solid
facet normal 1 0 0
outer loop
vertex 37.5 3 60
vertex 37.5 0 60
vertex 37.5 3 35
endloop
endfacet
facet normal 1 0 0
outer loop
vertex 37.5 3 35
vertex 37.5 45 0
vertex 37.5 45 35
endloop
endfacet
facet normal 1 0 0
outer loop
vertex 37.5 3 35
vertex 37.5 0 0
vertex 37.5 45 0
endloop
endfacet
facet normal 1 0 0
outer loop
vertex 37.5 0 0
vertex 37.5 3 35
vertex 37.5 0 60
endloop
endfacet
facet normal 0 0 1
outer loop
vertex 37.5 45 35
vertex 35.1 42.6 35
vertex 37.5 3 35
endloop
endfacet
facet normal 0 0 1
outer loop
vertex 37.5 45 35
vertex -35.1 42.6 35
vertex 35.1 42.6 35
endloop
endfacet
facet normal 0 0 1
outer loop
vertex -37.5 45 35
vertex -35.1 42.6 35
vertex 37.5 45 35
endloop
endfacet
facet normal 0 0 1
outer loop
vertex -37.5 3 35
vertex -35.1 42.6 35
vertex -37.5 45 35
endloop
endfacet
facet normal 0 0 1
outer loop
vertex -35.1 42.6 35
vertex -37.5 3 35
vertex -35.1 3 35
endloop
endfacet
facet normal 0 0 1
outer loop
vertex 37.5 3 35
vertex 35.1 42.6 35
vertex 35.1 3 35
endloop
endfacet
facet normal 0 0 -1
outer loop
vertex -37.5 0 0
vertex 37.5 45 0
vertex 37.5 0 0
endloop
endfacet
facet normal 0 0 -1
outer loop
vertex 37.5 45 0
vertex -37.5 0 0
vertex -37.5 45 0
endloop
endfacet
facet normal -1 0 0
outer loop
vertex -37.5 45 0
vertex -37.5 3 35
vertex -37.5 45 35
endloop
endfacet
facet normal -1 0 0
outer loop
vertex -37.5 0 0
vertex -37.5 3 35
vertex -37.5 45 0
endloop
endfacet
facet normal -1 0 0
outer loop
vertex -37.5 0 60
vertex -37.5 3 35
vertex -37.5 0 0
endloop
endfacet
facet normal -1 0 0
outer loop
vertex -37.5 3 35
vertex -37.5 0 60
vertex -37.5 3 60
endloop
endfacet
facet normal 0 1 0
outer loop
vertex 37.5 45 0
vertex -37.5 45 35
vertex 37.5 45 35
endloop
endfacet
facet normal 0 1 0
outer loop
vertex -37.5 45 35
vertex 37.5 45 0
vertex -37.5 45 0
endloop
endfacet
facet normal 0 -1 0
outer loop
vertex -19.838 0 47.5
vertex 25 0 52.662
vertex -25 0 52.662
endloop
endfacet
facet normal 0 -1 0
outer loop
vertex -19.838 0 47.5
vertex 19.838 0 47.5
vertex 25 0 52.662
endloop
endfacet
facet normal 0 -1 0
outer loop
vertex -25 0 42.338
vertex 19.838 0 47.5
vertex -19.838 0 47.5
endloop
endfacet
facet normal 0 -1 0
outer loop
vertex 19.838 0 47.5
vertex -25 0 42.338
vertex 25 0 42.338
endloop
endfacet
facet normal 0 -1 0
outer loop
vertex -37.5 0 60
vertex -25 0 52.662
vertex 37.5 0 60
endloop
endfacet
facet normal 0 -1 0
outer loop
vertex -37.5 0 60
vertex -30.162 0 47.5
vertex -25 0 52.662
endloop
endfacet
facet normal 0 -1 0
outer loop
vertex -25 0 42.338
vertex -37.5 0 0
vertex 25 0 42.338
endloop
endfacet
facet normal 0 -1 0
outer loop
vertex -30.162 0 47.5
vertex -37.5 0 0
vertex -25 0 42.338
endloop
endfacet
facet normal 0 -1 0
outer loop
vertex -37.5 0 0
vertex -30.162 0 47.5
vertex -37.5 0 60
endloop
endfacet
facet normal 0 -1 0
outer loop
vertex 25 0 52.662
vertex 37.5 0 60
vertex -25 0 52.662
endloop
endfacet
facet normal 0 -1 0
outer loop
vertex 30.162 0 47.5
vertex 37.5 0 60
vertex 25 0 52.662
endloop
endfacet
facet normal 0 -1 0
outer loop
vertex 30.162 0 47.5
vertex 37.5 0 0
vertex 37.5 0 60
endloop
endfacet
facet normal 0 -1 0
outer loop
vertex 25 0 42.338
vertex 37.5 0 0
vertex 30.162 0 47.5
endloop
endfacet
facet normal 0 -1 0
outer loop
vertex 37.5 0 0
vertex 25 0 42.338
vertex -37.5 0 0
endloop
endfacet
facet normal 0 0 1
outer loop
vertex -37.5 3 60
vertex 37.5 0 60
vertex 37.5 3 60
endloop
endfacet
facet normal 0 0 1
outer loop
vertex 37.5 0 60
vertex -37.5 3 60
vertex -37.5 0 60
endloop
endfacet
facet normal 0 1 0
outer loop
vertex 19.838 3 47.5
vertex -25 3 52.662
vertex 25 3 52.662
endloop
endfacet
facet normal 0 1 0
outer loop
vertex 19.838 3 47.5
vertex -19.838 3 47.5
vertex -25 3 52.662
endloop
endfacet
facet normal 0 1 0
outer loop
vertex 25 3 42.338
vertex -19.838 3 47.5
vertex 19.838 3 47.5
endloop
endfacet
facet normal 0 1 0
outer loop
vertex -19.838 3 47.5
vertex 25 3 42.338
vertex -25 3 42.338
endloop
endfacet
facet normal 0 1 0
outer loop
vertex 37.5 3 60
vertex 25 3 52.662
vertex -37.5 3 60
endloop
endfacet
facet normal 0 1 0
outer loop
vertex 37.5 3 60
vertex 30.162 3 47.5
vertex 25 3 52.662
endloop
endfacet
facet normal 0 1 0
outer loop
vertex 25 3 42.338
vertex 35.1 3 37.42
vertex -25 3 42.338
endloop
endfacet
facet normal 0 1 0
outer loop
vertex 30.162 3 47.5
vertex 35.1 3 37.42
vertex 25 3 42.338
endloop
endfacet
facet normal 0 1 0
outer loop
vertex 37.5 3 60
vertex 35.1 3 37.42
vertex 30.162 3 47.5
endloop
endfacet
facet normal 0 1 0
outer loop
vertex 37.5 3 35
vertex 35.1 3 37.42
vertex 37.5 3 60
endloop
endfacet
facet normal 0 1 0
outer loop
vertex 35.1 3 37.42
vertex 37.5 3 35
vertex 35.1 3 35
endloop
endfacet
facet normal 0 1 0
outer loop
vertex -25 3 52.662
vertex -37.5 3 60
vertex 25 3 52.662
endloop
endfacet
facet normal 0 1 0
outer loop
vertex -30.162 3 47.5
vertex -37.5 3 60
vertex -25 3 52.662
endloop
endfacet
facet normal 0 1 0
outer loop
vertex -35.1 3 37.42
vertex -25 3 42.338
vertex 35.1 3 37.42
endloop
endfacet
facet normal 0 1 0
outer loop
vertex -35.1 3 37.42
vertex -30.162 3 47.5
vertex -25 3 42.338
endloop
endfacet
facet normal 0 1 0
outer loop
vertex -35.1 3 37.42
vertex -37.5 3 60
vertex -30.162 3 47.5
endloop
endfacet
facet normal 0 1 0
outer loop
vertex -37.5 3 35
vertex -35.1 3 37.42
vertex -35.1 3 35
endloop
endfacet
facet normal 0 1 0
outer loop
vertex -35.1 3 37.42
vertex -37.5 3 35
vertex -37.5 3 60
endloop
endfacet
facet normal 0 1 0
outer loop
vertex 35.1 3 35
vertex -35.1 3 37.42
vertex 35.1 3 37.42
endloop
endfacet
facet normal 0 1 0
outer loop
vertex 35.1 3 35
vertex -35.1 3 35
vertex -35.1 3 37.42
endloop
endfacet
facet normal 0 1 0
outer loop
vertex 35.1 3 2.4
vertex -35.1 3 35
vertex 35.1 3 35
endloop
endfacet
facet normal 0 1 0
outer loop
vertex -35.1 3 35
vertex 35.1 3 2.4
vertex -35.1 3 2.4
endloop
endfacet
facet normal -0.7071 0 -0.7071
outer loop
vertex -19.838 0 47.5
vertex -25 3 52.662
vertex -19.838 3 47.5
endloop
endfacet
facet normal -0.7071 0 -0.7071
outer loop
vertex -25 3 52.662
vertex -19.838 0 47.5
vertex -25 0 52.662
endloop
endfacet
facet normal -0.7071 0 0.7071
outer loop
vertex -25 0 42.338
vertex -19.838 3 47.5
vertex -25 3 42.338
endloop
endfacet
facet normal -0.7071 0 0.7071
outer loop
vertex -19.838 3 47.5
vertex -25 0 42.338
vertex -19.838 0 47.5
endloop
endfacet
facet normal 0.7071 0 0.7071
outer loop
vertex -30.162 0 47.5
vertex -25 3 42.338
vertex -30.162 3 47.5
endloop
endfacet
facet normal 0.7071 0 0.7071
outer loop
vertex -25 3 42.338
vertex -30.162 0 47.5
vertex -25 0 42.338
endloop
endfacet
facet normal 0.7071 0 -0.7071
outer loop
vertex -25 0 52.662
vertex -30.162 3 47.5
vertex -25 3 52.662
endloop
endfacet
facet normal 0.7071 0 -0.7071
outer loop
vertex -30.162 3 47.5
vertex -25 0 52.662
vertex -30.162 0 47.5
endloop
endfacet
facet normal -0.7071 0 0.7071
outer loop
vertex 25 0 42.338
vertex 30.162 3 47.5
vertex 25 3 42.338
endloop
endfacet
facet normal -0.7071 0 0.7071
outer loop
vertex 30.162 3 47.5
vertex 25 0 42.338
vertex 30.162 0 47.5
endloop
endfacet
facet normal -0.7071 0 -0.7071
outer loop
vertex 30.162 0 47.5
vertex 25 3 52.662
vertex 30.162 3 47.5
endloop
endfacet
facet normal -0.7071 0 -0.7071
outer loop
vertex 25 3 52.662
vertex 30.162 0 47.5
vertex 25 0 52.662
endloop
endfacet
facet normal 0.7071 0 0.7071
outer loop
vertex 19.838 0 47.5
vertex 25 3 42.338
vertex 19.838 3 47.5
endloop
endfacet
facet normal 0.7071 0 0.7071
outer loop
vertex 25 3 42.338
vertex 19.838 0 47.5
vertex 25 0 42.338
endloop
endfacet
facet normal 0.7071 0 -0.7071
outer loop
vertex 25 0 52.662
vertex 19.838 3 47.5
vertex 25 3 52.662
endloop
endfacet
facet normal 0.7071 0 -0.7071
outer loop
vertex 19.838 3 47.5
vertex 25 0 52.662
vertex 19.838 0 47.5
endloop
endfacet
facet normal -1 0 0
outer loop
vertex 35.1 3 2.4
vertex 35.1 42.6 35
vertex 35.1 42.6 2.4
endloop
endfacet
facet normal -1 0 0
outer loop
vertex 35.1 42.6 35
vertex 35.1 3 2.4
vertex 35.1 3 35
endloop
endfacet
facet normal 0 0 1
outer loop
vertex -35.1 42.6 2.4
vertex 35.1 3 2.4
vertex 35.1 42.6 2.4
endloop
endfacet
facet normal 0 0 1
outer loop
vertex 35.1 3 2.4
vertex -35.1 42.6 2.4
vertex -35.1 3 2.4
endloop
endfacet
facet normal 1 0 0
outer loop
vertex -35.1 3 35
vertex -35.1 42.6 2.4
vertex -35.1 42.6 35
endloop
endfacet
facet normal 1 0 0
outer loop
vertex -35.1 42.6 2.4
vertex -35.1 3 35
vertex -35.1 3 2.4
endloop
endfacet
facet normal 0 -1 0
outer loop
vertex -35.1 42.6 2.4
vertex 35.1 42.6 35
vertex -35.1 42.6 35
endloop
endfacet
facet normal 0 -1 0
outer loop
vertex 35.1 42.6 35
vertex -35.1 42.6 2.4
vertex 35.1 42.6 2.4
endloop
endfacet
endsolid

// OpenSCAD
// Multiboard bolt-on small-parts bin; dimensions in mm.
// Print upright as shown, base at Z=0, opening up, no supports.
// Use two official Small Thread plain-head bolts through the rear holes into
// the board's SMALL holes, not standard M7 screws. Use washers at least 12 mm
// OD with a bore clearing 7.4 mm. Engagement = bolt length - back - washer:
// a 9 mm bolt, default 3 mm back and 1 mm washer engage 5 mm, not 6 mm.
// Choose length for the actual tile and washer; keep tips clear of the wall.
// Independent bin with clearance holes: no tiles or thread geometry reproduced.
// Multiboard by Keep Making / MultiBuild: 25 mm grid, threaded large/small holes.
// https://docs.multibuild.io/beginner-section/core-parts-documentation
// Small thread: measured 7 mm major, 6 mm minor, 3 mm pitch; bores clear 7 mm.
// Dimensional reference (original 6.4 mm tiles, not an official tolerance spec):
// https://github.com/asciipip/multiboard-parametric-stacked/blob/master/multiboard_base.scad
// Original system's custom licence: https://multibuild.io/license
// No downloaded model or code incorporated. Physical fit/load not yet tested.

// Outside bin width in 25 mm Multiboard units (count).
width_units = 3; // [2:1:6]
// Outside depth, from the rear face (mm).
bin_depth = 45; // [30:5:80]
// Height of the open bin rim above the bed (mm).
bin_height = 35; // [20:5:70]
// Side, front and floor thickness (mm).
wall = 2.4; // [1.6:0.4:4]
// Rear wall thickness; adjust bolt length with this (mm).
back_thickness = 3; // [2.4:0.2:4]
// Extra diametral clearance around the small-thread bolt (mm).
tolerance = 0.3; // [0.2:0.05:0.4]

/* [Hidden] */
pitch = 25;
thread_major = 7;
width = width_units * pitch;
rear_height = bin_height + pitch;
mount_z = bin_height + pitch / 2;
mount_x = (width - pitch) / 2;
eps = 0.02;

color("#b48ef0") difference() {
    union() {
        translate([-width / 2, 0, 0]) cube([width, bin_depth, bin_height]);
        translate([-width / 2, 0, 0]) cube([width, back_thickness, rear_height]);
    }
    // Open cavity leaves a full floor and the thicker mounting back.
    translate([-width / 2 + wall, back_thickness, wall])
        cube([width - 2 * wall, bin_depth - back_thickness - wall,
              bin_height + eps]);
    // Diamond openings fully clear round bolts; roofs print at 45 degrees.
    for (x = [-mount_x, mount_x])
        translate([x, back_thickness / 2, mount_z])
            rotate([0, 45, 0])
                cube([thread_major + tolerance, back_thickness + 2 * eps,
                      thread_major + tolerance], center = true);
}
